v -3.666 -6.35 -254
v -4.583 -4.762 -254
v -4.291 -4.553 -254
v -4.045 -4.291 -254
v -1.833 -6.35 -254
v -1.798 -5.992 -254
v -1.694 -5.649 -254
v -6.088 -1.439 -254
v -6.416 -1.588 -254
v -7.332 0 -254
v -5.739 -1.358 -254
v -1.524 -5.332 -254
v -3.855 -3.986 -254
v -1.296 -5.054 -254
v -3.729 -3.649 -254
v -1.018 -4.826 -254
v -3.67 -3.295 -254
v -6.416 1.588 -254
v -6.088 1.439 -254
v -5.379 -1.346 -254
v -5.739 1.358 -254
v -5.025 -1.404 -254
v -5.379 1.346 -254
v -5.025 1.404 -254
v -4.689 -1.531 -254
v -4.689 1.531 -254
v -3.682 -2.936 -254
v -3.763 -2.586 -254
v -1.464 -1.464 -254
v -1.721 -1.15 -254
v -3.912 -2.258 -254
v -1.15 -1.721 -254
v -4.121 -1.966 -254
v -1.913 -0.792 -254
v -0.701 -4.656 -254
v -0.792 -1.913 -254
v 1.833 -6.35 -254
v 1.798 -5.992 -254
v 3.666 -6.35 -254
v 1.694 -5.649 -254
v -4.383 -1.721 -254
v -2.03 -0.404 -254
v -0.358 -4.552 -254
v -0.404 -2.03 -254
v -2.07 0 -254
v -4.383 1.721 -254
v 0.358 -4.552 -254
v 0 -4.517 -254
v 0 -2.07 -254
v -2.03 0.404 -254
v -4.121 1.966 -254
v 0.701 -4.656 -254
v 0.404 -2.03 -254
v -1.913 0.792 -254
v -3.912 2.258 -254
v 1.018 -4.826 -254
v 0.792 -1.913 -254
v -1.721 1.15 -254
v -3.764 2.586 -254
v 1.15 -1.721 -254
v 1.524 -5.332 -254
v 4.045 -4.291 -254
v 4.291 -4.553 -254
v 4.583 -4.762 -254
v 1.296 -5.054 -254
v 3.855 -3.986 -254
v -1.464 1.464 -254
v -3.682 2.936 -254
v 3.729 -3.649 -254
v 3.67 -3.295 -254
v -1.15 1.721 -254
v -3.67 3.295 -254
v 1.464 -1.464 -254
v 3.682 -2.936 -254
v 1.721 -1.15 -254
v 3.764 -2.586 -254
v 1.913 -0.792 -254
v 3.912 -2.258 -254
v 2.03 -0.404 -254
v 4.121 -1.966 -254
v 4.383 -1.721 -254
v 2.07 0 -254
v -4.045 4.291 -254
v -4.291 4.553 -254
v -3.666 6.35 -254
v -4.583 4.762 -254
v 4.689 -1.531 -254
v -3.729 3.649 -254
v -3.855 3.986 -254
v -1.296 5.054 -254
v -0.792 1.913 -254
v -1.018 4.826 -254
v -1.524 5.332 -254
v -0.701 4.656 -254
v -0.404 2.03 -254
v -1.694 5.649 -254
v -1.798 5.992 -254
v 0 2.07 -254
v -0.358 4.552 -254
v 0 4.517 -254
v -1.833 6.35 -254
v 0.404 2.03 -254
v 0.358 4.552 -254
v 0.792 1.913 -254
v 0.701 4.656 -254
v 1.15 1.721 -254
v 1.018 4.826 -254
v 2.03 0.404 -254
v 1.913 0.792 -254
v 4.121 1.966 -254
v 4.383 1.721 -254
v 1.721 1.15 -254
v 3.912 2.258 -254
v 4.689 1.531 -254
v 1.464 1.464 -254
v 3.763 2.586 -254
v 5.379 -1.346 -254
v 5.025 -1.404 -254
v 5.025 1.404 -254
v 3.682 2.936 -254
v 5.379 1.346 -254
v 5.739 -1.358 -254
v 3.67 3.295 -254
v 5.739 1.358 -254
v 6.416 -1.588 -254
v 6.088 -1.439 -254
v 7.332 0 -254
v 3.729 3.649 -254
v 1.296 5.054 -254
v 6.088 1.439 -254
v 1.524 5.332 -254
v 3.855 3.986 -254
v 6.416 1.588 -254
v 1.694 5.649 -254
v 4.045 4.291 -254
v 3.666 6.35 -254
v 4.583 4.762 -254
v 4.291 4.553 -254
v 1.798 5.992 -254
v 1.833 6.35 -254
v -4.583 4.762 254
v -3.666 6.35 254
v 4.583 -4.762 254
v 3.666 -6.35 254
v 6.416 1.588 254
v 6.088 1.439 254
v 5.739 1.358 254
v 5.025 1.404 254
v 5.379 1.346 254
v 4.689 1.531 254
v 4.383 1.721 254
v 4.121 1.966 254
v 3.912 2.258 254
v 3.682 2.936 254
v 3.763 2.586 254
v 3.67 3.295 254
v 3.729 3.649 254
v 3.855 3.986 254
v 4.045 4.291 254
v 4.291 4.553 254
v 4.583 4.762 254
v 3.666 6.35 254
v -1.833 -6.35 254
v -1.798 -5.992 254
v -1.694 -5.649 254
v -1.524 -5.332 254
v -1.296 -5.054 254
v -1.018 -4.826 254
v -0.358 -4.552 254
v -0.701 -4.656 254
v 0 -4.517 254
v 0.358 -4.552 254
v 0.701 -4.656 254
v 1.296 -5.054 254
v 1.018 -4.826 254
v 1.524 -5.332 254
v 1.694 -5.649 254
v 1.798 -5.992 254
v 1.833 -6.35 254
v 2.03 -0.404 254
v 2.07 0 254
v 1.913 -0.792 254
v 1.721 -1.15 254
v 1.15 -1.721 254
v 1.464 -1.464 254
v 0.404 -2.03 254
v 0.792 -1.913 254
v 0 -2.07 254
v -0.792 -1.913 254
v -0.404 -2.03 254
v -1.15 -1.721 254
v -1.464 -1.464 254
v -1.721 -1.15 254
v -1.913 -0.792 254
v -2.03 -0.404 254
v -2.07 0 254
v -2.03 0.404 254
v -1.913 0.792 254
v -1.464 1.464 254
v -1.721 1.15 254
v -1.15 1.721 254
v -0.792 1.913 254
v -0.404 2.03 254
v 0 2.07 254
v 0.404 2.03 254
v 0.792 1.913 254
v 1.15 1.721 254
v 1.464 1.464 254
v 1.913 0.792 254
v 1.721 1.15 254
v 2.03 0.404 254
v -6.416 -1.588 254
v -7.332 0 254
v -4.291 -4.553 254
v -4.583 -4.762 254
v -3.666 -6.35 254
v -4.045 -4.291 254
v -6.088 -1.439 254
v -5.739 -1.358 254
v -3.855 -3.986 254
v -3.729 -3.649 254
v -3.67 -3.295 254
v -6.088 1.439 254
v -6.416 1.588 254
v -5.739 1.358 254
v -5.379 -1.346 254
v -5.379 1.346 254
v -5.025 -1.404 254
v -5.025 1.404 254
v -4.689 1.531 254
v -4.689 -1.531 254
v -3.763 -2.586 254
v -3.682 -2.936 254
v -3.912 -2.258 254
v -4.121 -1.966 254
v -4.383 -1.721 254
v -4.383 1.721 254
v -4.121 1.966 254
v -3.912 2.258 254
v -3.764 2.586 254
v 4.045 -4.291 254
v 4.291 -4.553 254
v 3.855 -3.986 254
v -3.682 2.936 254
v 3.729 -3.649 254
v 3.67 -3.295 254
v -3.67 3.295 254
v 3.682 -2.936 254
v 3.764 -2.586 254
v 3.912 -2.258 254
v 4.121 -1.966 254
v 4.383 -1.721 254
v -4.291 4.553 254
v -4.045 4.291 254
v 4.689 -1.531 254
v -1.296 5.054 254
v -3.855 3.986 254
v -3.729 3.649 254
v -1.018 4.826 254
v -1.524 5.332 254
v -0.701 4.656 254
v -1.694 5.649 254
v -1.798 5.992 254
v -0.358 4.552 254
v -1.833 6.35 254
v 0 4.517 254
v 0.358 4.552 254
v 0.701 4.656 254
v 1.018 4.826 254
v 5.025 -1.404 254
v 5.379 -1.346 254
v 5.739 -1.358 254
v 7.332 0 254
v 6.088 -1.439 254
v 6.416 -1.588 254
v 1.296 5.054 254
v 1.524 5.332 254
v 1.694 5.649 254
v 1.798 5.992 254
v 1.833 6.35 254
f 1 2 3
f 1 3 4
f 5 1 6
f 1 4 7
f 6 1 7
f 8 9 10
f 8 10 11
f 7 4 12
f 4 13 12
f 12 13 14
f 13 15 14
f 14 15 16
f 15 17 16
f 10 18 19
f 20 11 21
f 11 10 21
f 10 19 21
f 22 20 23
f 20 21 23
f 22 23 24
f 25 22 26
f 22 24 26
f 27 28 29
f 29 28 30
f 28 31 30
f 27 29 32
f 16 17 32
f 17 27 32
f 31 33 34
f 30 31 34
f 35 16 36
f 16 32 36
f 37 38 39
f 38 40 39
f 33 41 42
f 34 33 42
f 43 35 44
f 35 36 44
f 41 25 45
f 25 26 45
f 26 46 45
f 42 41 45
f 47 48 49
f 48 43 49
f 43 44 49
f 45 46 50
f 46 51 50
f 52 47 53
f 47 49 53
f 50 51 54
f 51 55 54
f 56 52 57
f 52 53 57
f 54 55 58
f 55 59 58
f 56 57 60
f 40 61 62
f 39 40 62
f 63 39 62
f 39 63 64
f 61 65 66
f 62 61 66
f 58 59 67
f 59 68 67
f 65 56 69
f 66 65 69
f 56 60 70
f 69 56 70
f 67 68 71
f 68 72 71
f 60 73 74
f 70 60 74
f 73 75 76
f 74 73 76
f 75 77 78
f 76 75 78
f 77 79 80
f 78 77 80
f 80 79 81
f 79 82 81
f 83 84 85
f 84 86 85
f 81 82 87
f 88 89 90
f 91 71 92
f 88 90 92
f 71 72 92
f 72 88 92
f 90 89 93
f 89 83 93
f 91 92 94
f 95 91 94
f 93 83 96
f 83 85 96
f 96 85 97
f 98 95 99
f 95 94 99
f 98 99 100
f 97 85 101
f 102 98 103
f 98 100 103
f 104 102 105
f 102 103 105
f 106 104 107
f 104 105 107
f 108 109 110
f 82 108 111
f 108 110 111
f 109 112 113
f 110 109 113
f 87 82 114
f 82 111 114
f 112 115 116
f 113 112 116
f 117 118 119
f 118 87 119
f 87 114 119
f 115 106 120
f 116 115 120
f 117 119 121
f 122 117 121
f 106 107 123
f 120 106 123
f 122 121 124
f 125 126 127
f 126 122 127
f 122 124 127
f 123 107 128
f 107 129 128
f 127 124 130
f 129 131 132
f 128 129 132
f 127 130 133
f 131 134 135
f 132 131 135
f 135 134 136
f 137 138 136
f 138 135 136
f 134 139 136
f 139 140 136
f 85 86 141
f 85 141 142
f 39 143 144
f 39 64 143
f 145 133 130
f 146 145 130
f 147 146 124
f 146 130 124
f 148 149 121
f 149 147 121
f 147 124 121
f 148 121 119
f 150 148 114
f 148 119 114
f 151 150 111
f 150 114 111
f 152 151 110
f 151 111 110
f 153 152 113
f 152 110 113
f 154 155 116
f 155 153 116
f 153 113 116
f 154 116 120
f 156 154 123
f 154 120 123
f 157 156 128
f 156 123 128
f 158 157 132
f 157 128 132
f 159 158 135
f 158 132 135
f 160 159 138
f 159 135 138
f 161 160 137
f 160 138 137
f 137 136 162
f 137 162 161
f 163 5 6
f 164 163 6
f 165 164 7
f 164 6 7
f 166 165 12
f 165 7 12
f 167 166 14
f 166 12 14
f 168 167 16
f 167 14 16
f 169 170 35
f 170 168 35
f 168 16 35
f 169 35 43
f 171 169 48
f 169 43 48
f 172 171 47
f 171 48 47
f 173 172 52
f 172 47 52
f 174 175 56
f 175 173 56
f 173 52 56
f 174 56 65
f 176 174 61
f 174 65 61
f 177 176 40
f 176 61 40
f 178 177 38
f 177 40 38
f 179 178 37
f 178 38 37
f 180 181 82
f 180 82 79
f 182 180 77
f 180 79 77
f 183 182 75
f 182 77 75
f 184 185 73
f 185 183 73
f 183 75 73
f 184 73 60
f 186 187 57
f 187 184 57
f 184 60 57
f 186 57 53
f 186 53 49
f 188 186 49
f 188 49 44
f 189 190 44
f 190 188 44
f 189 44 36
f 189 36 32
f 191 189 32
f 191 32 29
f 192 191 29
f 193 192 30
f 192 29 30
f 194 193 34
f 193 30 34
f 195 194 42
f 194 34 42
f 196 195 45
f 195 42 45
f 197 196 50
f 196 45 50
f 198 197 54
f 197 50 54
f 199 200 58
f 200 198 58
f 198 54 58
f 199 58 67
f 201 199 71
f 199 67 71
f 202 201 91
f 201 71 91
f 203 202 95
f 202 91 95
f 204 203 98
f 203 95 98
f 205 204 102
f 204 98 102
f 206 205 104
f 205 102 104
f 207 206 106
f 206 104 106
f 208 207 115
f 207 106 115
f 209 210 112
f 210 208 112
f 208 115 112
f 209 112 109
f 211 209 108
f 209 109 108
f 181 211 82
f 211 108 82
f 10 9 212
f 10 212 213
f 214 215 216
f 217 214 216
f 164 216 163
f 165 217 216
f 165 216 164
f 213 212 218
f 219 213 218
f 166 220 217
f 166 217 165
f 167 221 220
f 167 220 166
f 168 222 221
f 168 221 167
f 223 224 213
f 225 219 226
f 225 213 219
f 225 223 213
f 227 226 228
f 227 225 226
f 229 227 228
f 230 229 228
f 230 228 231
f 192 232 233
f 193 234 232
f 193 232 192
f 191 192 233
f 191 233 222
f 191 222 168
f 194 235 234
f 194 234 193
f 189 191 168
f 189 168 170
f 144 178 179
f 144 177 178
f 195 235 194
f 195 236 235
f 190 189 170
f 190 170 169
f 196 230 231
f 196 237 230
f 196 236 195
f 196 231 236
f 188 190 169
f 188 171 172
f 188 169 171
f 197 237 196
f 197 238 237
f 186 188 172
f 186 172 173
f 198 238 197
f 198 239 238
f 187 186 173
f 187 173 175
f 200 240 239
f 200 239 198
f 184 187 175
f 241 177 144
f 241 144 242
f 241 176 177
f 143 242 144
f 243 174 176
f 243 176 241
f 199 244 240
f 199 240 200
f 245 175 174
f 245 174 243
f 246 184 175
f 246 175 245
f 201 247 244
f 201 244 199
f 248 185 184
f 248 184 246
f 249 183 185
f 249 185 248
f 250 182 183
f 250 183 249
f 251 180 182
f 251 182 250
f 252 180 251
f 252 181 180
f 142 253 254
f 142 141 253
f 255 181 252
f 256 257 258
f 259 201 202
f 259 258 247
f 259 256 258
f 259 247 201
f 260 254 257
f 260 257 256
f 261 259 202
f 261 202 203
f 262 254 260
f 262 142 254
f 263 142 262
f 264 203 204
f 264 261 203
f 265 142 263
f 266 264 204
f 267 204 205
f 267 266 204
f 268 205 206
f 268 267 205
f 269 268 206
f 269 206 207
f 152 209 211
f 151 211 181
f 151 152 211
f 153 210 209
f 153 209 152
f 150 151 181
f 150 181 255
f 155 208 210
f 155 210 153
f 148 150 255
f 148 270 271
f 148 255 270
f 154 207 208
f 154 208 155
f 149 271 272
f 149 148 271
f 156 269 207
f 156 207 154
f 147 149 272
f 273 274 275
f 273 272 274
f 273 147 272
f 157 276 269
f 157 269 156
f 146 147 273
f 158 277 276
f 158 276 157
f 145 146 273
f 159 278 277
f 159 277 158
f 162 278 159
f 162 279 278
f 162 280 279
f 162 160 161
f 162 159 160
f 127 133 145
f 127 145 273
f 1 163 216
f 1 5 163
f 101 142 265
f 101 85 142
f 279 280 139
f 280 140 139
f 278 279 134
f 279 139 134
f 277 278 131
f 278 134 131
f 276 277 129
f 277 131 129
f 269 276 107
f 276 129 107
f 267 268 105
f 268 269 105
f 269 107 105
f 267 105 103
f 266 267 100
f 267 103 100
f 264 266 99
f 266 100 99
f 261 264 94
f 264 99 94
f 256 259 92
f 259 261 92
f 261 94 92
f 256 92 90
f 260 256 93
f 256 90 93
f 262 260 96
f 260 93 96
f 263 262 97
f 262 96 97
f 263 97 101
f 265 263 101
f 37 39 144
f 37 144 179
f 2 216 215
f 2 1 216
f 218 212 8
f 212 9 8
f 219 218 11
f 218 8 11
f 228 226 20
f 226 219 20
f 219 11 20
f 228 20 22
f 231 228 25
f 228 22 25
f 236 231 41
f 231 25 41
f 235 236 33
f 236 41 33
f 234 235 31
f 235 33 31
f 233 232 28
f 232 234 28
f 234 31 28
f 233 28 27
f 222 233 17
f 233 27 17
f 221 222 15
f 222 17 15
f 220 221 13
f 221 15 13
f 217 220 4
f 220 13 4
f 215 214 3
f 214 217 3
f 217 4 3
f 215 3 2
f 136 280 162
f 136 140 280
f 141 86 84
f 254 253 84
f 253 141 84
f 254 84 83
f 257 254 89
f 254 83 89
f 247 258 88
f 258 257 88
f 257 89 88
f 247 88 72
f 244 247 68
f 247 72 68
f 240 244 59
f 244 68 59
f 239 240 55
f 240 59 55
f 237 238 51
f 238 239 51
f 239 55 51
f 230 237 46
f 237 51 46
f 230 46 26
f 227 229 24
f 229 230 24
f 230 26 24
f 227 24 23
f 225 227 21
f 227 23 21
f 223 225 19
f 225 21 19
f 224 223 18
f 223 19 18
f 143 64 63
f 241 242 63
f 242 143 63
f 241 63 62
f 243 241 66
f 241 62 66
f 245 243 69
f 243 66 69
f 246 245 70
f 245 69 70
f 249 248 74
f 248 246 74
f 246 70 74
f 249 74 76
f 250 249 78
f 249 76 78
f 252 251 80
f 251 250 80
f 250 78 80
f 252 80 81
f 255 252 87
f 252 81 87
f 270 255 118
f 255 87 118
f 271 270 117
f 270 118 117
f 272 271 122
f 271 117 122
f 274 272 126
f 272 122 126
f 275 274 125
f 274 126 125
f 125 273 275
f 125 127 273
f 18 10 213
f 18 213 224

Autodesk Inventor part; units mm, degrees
ref_plane "YZ Plane" through (0, 0, 0) normal (1, 0, 0) x (0, 1, 0)
ref_plane "XZ Plane" through (0, 0, 0) normal (0, 1, 0) x (-1, 0, 0)
ref_plane "XY Plane" through (0, 0, 0) normal (0, 0, 1) x (1, 0, 0)
sketch "Sketch1" plane through (0, 0, 0) normal (0, 0, 1) x (1, 0, 0)
  line L0 (-3.6662, 6.35) -> (-1.8331, 6.35)
  line L1 (3.6662, 6.35) -> (4.5827, 4.7625)
  line L2 (7.3323, 0) -> (6.4158, -1.5875)
  line L3 (3.6662, -6.35) -> (1.8331, -6.35)
  line L4 (-3.6662, -6.35) -> (-4.5827, -4.7625)
  line L5 (-7.3323, 0) -> (-6.4158, 1.5875)
  arc A0 (-1.8331, 6.35) -> (1.8331, 6.35) centre (0, 6.35) ccw
  arc A1 (-6.4158, 1.5875) -> (-4.5827, 4.7625) centre (-5.4993, 3.175) ccw
  arc A2 (-4.5827, -4.7625) -> (-6.4158, -1.5875) centre (-5.4993, -3.175) ccw
  arc A3 (1.8331, -6.35) -> (-1.8331, -6.35) centre (0, -6.35) ccw
  arc A4 (6.4158, -1.5875) -> (4.5827, -4.7625) centre (5.4993, -3.175) ccw
  arc A5 (4.5827, 4.7625) -> (6.4158, 1.5875) centre (5.4993, 3.175) ccw
  line L6 (-1.8331, 6.35) -> (1.8331, 6.35) construction
  line L7 (1.8331, 6.35) -> (3.6662, 6.35)
  line L8 (-4.5827, 4.7625) -> (-3.6662, 6.35)
  line L9 (-6.4158, 1.5875) -> (-4.5827, 4.7625) construction
  line L10 (-4.5827, -4.7625) -> (-6.4158, -1.5875) construction
  line L11 (-6.4158, -1.5875) -> (-7.3323, 0)
  line L12 (-1.8331, -6.35) -> (-3.6662, -6.35)
  line L13 (1.8331, -6.35) -> (-1.8331, -6.35) construction
  line L14 (4.5827, -4.7625) -> (3.6662, -6.35)
  line L15 (6.4158, -1.5875) -> (4.5827, -4.7625) construction
  line L16 (6.4158, 1.5875) -> (7.3323, 0)
  line L17 (4.5827, 4.7625) -> (6.4158, 1.5875) construction
  circle A6 centre (0, 0) radius 2.0701
  dimension "d0" = 12.7
  dimension "d1" = 1.8331
  dimension "d4" = 360
  dimension "d6" = 1.8331
  dimension "d7" = 1.8331
  dimension "d8" = 4.1402
extrude "Extrusion1" add sketch "Sketch1" along normal mid plane 508
properties part number "Outtake_churro"
